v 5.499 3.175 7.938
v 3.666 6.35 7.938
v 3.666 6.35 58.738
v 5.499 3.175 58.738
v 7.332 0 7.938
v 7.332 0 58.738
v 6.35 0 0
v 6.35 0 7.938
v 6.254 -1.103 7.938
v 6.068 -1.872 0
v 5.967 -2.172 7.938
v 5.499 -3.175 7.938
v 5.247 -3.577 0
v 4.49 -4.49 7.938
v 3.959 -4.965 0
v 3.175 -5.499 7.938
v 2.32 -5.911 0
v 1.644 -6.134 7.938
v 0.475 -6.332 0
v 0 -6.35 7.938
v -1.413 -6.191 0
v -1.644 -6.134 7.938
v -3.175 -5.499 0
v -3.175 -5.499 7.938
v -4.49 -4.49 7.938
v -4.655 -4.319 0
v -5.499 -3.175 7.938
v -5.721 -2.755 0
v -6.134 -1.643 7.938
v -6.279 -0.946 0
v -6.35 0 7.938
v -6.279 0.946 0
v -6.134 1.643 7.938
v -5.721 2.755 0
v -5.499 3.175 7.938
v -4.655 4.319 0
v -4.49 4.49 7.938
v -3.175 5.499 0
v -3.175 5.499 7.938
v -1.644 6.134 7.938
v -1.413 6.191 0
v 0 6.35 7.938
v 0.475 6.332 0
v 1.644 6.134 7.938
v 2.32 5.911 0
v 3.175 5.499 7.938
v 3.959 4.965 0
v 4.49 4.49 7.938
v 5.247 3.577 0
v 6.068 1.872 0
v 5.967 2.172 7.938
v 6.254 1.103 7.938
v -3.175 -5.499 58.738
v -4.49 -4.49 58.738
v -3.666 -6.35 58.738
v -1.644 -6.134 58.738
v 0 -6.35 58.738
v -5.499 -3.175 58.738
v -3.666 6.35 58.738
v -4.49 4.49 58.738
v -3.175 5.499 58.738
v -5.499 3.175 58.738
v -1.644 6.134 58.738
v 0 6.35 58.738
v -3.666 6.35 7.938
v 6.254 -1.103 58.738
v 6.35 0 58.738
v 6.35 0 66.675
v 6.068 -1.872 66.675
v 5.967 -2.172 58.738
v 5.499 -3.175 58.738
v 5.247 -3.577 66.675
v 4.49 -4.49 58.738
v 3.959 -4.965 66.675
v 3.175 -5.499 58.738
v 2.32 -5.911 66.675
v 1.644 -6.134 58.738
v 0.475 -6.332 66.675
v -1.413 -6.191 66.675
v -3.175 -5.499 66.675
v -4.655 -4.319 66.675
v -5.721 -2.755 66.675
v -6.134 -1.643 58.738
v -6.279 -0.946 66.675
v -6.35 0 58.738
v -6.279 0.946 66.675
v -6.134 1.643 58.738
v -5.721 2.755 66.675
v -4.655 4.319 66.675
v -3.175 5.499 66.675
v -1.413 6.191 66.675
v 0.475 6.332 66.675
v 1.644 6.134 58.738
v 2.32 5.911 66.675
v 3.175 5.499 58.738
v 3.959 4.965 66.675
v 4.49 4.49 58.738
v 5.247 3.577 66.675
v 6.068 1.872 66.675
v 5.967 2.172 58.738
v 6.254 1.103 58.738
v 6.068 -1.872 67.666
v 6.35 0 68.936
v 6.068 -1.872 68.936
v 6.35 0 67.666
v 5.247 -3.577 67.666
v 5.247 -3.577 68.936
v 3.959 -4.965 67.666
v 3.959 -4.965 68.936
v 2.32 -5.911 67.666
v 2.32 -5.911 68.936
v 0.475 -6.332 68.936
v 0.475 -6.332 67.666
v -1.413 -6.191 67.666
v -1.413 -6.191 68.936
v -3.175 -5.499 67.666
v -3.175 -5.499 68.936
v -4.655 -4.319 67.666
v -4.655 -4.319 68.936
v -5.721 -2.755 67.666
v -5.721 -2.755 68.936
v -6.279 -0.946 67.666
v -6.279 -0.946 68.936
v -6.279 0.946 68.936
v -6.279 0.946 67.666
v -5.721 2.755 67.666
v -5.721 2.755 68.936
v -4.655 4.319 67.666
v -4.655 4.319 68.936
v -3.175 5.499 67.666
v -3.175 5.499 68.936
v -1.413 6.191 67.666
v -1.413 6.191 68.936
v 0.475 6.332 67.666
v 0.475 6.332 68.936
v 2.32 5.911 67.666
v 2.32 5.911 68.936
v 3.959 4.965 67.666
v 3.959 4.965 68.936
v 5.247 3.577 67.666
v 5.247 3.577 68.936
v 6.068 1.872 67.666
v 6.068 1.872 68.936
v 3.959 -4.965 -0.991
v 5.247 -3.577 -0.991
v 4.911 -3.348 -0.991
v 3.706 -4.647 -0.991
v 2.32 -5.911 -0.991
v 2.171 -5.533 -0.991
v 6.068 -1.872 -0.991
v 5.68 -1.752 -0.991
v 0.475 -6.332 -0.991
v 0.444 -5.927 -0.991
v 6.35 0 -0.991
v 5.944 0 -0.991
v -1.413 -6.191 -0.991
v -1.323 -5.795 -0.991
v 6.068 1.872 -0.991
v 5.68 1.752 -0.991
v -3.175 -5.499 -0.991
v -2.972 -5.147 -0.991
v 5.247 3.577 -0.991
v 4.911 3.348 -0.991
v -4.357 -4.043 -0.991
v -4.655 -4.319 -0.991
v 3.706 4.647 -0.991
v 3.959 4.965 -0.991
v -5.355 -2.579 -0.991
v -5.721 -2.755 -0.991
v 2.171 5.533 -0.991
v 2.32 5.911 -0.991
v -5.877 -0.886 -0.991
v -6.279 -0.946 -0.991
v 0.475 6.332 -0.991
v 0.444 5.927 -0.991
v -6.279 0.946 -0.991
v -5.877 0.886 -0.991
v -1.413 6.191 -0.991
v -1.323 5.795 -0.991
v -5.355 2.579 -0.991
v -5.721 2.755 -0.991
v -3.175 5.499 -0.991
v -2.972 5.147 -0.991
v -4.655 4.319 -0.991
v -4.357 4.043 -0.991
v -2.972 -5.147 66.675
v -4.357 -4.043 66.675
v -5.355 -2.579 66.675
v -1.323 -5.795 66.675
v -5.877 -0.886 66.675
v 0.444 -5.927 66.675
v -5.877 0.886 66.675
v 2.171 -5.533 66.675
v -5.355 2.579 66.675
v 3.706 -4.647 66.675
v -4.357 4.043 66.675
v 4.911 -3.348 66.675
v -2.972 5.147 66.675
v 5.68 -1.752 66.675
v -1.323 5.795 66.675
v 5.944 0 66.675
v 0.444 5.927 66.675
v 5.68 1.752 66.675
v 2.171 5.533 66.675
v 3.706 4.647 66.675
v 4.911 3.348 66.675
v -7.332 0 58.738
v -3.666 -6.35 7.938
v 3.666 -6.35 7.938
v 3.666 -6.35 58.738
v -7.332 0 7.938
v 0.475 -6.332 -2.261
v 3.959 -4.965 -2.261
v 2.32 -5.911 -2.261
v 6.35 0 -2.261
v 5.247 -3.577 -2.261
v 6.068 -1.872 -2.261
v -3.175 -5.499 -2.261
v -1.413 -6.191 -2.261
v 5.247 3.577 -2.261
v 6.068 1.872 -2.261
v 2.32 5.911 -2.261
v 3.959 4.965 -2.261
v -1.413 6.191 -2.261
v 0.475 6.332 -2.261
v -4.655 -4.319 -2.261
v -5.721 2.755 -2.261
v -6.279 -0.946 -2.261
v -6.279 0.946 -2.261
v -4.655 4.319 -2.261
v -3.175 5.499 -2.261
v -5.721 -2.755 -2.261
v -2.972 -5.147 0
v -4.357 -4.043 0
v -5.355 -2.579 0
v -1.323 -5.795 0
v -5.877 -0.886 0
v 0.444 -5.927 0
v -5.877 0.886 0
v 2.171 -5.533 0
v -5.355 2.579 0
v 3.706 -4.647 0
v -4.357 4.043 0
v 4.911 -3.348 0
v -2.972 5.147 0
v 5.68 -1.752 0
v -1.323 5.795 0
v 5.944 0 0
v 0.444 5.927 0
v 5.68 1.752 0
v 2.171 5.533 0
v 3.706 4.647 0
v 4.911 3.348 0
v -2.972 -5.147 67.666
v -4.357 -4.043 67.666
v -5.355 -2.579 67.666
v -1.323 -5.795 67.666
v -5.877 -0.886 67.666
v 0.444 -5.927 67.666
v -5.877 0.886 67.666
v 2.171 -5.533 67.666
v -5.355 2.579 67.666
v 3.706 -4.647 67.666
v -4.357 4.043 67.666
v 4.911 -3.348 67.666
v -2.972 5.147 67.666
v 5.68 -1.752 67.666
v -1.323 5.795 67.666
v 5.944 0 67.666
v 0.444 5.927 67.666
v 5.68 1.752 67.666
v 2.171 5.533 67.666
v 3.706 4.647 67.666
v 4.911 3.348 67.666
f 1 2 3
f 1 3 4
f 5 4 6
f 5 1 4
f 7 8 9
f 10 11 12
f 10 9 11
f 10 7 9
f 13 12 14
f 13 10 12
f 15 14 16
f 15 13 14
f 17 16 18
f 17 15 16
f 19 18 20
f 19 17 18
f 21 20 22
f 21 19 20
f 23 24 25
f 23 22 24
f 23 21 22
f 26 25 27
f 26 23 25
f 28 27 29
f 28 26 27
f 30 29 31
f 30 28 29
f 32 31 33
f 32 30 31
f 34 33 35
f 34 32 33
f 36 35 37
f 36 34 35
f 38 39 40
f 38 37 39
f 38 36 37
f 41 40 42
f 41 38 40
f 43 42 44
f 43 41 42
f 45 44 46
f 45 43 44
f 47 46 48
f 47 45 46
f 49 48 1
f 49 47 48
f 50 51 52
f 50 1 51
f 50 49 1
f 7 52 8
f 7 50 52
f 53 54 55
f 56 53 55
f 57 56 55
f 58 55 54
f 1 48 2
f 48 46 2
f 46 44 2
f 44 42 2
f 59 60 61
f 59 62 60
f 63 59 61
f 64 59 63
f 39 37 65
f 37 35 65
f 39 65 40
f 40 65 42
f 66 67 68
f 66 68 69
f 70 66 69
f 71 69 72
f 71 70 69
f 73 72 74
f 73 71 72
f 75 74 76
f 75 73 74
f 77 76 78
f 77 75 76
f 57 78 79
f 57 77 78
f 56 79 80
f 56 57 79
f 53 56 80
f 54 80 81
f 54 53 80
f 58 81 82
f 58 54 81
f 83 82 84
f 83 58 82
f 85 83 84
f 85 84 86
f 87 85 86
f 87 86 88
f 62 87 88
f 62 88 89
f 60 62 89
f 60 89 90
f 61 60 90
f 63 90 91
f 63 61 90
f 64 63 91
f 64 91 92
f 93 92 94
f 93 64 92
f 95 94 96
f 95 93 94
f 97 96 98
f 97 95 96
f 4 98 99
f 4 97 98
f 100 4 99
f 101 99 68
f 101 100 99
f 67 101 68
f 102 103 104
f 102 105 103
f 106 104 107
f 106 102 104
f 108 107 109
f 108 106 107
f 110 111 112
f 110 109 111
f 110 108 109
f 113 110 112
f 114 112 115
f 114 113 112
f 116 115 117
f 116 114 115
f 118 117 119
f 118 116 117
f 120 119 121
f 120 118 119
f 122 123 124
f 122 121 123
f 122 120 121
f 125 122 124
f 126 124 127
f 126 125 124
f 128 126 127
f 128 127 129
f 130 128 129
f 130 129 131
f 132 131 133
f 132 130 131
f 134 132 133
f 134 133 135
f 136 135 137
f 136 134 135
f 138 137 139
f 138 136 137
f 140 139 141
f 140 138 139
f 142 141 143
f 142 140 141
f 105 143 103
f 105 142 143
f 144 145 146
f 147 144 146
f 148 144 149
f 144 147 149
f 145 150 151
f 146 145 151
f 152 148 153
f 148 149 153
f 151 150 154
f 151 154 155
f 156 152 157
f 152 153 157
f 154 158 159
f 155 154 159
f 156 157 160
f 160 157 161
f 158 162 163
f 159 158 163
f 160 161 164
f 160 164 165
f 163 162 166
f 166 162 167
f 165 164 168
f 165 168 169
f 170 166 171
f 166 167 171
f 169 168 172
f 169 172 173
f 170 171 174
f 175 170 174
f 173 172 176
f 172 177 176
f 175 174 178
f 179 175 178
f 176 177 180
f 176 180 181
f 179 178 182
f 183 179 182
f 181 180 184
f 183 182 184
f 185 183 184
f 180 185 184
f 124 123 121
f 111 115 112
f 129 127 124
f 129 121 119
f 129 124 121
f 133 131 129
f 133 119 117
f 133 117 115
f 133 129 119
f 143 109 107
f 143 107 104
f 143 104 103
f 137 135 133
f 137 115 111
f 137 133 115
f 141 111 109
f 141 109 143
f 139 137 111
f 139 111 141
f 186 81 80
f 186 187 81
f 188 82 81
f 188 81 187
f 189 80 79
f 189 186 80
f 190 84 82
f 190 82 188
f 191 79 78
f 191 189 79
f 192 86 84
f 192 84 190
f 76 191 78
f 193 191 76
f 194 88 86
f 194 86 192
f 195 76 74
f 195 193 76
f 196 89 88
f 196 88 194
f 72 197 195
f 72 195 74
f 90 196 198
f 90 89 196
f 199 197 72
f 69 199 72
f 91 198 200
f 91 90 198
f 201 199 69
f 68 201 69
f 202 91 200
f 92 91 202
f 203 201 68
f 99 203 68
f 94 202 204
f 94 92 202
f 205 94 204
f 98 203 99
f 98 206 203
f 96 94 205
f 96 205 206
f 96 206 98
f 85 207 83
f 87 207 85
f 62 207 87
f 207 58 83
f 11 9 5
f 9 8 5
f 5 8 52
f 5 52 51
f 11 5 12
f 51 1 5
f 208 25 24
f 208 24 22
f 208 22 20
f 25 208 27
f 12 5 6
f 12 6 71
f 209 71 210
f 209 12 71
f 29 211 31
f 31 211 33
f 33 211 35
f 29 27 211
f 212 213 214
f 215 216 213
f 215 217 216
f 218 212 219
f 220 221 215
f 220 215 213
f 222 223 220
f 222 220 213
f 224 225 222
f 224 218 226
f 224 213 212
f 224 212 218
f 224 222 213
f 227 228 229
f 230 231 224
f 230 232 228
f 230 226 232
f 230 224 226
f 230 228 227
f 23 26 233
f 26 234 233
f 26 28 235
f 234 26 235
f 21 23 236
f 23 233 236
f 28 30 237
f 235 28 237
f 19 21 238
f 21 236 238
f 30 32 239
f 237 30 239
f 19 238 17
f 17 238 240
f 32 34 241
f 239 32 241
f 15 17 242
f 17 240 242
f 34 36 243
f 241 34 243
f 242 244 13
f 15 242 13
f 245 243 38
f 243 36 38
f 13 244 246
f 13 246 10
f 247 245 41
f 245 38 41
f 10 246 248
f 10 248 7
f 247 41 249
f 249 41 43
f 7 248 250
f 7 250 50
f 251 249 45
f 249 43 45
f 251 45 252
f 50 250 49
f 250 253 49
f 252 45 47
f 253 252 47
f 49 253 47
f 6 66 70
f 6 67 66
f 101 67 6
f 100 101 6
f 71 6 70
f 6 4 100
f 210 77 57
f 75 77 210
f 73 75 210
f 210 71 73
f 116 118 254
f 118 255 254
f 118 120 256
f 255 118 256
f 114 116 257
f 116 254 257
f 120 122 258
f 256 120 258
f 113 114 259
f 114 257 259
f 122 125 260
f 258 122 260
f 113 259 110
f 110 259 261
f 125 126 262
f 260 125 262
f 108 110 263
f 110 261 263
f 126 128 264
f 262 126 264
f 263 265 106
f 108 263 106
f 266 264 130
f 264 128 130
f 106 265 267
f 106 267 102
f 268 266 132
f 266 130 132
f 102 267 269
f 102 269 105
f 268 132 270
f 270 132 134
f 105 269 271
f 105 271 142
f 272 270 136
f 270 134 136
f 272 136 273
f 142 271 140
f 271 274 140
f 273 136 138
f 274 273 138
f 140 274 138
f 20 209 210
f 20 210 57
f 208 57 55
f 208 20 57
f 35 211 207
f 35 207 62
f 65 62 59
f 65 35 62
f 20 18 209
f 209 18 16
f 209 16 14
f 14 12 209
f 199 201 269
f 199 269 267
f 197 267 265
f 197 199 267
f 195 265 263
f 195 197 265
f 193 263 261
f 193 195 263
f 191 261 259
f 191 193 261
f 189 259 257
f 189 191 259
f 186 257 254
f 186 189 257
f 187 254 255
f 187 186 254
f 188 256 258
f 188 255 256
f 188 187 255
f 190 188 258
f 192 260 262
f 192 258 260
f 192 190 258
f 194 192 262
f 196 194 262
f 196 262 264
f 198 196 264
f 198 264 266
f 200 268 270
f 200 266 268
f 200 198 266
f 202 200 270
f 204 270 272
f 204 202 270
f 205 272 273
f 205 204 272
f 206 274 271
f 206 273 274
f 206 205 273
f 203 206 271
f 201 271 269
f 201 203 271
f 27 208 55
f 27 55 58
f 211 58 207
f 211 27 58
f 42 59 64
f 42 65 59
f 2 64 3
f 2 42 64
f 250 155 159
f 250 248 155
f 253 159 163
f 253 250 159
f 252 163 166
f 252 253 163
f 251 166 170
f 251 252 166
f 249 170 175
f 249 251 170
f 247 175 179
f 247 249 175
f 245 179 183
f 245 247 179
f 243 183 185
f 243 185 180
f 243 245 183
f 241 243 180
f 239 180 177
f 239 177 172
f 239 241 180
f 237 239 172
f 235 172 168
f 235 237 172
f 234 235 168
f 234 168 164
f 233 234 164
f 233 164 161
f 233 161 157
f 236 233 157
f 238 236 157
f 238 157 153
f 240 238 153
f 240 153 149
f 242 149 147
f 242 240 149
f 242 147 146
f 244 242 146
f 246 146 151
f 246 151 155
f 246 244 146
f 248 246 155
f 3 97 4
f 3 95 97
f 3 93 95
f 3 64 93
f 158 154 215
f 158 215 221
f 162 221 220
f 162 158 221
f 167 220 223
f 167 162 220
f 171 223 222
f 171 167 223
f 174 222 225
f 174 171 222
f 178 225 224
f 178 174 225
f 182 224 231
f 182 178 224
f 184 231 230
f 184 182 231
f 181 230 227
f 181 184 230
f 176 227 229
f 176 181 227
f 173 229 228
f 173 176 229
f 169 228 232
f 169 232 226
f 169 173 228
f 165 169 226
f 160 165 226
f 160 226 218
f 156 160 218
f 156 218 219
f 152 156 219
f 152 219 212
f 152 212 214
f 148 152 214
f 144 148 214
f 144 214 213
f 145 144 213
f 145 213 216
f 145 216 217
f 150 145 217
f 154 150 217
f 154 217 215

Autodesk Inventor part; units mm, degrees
ref_plane "YZ Plane" through (0, 0, 0) normal (1, 0, 0) x (0, 1, 0)
ref_plane "XZ Plane" through (0, 0, 0) normal (0, 1, 0) x (-1, 0, 0)
sketch "Sketch1" plane through (0, 0, 0) normal (0, 0, 1) x (1, 0, 0)
  circle A0 centre (0, 0) radius 6.35
  dimension "d0" = 12.7
extrude "Extrusion1" add sketch "Sketch1" along normal blind 7.9375
sketch "Sketch2" plane through (0, 0, 7.9375) normal (0, 0, 1) x (1, 0, 0)
  circle A0 centre (0, 0) radius 6.35 projected
  line L0 (-7.3323, 0) -> (-3.6662, 6.35)
  line L1 (-3.6662, 6.35) -> (3.6662, 6.35)
  line L2 (3.6662, 6.35) -> (7.3323, 0)
  line L3 (7.3323, 0) -> (3.6662, -6.35)
  line L4 (3.6662, -6.35) -> (-3.6662, -6.35)
  line L5 (-3.6662, -6.35) -> (-7.3323, 0)
  dimension "d4" = 12.7
extrude "Extrusion2" add sketch "Sketch2" along normal blind 50.8
sketch "Sketch3" plane through (0, 0, 58.7375) normal (0, 0, 1) x (1, 0, 0)
  circle A0 centre (0, 0) radius 6.35
  dimension "d7" = 12.7
extrude "Extrusion3" add sketch "Sketch3" along normal blind 7.9375
ref_plane "Work Plane1" through (0, 0, 33.3375) normal (0, 0, 1) x (1, 0, 0)
sketch "Sketch4" plane through (0, 0, 66.675) normal (0, 0, 1) x (1, 0, 0)
  circle A0 centre (0, 0) radius 6.35 projected
  circle A1 centre (0, 0) radius 5.9436
  dimension "d10" = 11.8872
extrude "Extrusion4" add sketch "Sketch4" along normal blind 0.9906 contours A1
sketch "Sketch5" plane through (0, 0, 67.6656) normal (0, 0, 1) x (1, 0, 0)
  circle A0 centre (0, 0) radius 5.9436 projected
  circle A1 centre (0, 0) radius 6.35
  dimension "d14" = 12.7
extrude "Extrusion5" add sketch "Sketch5" along normal blind 1.27 contours A0 | A1
mirror "Mirror1" about plane through (0, 0, 33.3375) normal (0, 0, 1) of "Extrusion4", "Extrusion5"
properties part number "Carriage Shaft - Lower" material "Aluminum 6061"
